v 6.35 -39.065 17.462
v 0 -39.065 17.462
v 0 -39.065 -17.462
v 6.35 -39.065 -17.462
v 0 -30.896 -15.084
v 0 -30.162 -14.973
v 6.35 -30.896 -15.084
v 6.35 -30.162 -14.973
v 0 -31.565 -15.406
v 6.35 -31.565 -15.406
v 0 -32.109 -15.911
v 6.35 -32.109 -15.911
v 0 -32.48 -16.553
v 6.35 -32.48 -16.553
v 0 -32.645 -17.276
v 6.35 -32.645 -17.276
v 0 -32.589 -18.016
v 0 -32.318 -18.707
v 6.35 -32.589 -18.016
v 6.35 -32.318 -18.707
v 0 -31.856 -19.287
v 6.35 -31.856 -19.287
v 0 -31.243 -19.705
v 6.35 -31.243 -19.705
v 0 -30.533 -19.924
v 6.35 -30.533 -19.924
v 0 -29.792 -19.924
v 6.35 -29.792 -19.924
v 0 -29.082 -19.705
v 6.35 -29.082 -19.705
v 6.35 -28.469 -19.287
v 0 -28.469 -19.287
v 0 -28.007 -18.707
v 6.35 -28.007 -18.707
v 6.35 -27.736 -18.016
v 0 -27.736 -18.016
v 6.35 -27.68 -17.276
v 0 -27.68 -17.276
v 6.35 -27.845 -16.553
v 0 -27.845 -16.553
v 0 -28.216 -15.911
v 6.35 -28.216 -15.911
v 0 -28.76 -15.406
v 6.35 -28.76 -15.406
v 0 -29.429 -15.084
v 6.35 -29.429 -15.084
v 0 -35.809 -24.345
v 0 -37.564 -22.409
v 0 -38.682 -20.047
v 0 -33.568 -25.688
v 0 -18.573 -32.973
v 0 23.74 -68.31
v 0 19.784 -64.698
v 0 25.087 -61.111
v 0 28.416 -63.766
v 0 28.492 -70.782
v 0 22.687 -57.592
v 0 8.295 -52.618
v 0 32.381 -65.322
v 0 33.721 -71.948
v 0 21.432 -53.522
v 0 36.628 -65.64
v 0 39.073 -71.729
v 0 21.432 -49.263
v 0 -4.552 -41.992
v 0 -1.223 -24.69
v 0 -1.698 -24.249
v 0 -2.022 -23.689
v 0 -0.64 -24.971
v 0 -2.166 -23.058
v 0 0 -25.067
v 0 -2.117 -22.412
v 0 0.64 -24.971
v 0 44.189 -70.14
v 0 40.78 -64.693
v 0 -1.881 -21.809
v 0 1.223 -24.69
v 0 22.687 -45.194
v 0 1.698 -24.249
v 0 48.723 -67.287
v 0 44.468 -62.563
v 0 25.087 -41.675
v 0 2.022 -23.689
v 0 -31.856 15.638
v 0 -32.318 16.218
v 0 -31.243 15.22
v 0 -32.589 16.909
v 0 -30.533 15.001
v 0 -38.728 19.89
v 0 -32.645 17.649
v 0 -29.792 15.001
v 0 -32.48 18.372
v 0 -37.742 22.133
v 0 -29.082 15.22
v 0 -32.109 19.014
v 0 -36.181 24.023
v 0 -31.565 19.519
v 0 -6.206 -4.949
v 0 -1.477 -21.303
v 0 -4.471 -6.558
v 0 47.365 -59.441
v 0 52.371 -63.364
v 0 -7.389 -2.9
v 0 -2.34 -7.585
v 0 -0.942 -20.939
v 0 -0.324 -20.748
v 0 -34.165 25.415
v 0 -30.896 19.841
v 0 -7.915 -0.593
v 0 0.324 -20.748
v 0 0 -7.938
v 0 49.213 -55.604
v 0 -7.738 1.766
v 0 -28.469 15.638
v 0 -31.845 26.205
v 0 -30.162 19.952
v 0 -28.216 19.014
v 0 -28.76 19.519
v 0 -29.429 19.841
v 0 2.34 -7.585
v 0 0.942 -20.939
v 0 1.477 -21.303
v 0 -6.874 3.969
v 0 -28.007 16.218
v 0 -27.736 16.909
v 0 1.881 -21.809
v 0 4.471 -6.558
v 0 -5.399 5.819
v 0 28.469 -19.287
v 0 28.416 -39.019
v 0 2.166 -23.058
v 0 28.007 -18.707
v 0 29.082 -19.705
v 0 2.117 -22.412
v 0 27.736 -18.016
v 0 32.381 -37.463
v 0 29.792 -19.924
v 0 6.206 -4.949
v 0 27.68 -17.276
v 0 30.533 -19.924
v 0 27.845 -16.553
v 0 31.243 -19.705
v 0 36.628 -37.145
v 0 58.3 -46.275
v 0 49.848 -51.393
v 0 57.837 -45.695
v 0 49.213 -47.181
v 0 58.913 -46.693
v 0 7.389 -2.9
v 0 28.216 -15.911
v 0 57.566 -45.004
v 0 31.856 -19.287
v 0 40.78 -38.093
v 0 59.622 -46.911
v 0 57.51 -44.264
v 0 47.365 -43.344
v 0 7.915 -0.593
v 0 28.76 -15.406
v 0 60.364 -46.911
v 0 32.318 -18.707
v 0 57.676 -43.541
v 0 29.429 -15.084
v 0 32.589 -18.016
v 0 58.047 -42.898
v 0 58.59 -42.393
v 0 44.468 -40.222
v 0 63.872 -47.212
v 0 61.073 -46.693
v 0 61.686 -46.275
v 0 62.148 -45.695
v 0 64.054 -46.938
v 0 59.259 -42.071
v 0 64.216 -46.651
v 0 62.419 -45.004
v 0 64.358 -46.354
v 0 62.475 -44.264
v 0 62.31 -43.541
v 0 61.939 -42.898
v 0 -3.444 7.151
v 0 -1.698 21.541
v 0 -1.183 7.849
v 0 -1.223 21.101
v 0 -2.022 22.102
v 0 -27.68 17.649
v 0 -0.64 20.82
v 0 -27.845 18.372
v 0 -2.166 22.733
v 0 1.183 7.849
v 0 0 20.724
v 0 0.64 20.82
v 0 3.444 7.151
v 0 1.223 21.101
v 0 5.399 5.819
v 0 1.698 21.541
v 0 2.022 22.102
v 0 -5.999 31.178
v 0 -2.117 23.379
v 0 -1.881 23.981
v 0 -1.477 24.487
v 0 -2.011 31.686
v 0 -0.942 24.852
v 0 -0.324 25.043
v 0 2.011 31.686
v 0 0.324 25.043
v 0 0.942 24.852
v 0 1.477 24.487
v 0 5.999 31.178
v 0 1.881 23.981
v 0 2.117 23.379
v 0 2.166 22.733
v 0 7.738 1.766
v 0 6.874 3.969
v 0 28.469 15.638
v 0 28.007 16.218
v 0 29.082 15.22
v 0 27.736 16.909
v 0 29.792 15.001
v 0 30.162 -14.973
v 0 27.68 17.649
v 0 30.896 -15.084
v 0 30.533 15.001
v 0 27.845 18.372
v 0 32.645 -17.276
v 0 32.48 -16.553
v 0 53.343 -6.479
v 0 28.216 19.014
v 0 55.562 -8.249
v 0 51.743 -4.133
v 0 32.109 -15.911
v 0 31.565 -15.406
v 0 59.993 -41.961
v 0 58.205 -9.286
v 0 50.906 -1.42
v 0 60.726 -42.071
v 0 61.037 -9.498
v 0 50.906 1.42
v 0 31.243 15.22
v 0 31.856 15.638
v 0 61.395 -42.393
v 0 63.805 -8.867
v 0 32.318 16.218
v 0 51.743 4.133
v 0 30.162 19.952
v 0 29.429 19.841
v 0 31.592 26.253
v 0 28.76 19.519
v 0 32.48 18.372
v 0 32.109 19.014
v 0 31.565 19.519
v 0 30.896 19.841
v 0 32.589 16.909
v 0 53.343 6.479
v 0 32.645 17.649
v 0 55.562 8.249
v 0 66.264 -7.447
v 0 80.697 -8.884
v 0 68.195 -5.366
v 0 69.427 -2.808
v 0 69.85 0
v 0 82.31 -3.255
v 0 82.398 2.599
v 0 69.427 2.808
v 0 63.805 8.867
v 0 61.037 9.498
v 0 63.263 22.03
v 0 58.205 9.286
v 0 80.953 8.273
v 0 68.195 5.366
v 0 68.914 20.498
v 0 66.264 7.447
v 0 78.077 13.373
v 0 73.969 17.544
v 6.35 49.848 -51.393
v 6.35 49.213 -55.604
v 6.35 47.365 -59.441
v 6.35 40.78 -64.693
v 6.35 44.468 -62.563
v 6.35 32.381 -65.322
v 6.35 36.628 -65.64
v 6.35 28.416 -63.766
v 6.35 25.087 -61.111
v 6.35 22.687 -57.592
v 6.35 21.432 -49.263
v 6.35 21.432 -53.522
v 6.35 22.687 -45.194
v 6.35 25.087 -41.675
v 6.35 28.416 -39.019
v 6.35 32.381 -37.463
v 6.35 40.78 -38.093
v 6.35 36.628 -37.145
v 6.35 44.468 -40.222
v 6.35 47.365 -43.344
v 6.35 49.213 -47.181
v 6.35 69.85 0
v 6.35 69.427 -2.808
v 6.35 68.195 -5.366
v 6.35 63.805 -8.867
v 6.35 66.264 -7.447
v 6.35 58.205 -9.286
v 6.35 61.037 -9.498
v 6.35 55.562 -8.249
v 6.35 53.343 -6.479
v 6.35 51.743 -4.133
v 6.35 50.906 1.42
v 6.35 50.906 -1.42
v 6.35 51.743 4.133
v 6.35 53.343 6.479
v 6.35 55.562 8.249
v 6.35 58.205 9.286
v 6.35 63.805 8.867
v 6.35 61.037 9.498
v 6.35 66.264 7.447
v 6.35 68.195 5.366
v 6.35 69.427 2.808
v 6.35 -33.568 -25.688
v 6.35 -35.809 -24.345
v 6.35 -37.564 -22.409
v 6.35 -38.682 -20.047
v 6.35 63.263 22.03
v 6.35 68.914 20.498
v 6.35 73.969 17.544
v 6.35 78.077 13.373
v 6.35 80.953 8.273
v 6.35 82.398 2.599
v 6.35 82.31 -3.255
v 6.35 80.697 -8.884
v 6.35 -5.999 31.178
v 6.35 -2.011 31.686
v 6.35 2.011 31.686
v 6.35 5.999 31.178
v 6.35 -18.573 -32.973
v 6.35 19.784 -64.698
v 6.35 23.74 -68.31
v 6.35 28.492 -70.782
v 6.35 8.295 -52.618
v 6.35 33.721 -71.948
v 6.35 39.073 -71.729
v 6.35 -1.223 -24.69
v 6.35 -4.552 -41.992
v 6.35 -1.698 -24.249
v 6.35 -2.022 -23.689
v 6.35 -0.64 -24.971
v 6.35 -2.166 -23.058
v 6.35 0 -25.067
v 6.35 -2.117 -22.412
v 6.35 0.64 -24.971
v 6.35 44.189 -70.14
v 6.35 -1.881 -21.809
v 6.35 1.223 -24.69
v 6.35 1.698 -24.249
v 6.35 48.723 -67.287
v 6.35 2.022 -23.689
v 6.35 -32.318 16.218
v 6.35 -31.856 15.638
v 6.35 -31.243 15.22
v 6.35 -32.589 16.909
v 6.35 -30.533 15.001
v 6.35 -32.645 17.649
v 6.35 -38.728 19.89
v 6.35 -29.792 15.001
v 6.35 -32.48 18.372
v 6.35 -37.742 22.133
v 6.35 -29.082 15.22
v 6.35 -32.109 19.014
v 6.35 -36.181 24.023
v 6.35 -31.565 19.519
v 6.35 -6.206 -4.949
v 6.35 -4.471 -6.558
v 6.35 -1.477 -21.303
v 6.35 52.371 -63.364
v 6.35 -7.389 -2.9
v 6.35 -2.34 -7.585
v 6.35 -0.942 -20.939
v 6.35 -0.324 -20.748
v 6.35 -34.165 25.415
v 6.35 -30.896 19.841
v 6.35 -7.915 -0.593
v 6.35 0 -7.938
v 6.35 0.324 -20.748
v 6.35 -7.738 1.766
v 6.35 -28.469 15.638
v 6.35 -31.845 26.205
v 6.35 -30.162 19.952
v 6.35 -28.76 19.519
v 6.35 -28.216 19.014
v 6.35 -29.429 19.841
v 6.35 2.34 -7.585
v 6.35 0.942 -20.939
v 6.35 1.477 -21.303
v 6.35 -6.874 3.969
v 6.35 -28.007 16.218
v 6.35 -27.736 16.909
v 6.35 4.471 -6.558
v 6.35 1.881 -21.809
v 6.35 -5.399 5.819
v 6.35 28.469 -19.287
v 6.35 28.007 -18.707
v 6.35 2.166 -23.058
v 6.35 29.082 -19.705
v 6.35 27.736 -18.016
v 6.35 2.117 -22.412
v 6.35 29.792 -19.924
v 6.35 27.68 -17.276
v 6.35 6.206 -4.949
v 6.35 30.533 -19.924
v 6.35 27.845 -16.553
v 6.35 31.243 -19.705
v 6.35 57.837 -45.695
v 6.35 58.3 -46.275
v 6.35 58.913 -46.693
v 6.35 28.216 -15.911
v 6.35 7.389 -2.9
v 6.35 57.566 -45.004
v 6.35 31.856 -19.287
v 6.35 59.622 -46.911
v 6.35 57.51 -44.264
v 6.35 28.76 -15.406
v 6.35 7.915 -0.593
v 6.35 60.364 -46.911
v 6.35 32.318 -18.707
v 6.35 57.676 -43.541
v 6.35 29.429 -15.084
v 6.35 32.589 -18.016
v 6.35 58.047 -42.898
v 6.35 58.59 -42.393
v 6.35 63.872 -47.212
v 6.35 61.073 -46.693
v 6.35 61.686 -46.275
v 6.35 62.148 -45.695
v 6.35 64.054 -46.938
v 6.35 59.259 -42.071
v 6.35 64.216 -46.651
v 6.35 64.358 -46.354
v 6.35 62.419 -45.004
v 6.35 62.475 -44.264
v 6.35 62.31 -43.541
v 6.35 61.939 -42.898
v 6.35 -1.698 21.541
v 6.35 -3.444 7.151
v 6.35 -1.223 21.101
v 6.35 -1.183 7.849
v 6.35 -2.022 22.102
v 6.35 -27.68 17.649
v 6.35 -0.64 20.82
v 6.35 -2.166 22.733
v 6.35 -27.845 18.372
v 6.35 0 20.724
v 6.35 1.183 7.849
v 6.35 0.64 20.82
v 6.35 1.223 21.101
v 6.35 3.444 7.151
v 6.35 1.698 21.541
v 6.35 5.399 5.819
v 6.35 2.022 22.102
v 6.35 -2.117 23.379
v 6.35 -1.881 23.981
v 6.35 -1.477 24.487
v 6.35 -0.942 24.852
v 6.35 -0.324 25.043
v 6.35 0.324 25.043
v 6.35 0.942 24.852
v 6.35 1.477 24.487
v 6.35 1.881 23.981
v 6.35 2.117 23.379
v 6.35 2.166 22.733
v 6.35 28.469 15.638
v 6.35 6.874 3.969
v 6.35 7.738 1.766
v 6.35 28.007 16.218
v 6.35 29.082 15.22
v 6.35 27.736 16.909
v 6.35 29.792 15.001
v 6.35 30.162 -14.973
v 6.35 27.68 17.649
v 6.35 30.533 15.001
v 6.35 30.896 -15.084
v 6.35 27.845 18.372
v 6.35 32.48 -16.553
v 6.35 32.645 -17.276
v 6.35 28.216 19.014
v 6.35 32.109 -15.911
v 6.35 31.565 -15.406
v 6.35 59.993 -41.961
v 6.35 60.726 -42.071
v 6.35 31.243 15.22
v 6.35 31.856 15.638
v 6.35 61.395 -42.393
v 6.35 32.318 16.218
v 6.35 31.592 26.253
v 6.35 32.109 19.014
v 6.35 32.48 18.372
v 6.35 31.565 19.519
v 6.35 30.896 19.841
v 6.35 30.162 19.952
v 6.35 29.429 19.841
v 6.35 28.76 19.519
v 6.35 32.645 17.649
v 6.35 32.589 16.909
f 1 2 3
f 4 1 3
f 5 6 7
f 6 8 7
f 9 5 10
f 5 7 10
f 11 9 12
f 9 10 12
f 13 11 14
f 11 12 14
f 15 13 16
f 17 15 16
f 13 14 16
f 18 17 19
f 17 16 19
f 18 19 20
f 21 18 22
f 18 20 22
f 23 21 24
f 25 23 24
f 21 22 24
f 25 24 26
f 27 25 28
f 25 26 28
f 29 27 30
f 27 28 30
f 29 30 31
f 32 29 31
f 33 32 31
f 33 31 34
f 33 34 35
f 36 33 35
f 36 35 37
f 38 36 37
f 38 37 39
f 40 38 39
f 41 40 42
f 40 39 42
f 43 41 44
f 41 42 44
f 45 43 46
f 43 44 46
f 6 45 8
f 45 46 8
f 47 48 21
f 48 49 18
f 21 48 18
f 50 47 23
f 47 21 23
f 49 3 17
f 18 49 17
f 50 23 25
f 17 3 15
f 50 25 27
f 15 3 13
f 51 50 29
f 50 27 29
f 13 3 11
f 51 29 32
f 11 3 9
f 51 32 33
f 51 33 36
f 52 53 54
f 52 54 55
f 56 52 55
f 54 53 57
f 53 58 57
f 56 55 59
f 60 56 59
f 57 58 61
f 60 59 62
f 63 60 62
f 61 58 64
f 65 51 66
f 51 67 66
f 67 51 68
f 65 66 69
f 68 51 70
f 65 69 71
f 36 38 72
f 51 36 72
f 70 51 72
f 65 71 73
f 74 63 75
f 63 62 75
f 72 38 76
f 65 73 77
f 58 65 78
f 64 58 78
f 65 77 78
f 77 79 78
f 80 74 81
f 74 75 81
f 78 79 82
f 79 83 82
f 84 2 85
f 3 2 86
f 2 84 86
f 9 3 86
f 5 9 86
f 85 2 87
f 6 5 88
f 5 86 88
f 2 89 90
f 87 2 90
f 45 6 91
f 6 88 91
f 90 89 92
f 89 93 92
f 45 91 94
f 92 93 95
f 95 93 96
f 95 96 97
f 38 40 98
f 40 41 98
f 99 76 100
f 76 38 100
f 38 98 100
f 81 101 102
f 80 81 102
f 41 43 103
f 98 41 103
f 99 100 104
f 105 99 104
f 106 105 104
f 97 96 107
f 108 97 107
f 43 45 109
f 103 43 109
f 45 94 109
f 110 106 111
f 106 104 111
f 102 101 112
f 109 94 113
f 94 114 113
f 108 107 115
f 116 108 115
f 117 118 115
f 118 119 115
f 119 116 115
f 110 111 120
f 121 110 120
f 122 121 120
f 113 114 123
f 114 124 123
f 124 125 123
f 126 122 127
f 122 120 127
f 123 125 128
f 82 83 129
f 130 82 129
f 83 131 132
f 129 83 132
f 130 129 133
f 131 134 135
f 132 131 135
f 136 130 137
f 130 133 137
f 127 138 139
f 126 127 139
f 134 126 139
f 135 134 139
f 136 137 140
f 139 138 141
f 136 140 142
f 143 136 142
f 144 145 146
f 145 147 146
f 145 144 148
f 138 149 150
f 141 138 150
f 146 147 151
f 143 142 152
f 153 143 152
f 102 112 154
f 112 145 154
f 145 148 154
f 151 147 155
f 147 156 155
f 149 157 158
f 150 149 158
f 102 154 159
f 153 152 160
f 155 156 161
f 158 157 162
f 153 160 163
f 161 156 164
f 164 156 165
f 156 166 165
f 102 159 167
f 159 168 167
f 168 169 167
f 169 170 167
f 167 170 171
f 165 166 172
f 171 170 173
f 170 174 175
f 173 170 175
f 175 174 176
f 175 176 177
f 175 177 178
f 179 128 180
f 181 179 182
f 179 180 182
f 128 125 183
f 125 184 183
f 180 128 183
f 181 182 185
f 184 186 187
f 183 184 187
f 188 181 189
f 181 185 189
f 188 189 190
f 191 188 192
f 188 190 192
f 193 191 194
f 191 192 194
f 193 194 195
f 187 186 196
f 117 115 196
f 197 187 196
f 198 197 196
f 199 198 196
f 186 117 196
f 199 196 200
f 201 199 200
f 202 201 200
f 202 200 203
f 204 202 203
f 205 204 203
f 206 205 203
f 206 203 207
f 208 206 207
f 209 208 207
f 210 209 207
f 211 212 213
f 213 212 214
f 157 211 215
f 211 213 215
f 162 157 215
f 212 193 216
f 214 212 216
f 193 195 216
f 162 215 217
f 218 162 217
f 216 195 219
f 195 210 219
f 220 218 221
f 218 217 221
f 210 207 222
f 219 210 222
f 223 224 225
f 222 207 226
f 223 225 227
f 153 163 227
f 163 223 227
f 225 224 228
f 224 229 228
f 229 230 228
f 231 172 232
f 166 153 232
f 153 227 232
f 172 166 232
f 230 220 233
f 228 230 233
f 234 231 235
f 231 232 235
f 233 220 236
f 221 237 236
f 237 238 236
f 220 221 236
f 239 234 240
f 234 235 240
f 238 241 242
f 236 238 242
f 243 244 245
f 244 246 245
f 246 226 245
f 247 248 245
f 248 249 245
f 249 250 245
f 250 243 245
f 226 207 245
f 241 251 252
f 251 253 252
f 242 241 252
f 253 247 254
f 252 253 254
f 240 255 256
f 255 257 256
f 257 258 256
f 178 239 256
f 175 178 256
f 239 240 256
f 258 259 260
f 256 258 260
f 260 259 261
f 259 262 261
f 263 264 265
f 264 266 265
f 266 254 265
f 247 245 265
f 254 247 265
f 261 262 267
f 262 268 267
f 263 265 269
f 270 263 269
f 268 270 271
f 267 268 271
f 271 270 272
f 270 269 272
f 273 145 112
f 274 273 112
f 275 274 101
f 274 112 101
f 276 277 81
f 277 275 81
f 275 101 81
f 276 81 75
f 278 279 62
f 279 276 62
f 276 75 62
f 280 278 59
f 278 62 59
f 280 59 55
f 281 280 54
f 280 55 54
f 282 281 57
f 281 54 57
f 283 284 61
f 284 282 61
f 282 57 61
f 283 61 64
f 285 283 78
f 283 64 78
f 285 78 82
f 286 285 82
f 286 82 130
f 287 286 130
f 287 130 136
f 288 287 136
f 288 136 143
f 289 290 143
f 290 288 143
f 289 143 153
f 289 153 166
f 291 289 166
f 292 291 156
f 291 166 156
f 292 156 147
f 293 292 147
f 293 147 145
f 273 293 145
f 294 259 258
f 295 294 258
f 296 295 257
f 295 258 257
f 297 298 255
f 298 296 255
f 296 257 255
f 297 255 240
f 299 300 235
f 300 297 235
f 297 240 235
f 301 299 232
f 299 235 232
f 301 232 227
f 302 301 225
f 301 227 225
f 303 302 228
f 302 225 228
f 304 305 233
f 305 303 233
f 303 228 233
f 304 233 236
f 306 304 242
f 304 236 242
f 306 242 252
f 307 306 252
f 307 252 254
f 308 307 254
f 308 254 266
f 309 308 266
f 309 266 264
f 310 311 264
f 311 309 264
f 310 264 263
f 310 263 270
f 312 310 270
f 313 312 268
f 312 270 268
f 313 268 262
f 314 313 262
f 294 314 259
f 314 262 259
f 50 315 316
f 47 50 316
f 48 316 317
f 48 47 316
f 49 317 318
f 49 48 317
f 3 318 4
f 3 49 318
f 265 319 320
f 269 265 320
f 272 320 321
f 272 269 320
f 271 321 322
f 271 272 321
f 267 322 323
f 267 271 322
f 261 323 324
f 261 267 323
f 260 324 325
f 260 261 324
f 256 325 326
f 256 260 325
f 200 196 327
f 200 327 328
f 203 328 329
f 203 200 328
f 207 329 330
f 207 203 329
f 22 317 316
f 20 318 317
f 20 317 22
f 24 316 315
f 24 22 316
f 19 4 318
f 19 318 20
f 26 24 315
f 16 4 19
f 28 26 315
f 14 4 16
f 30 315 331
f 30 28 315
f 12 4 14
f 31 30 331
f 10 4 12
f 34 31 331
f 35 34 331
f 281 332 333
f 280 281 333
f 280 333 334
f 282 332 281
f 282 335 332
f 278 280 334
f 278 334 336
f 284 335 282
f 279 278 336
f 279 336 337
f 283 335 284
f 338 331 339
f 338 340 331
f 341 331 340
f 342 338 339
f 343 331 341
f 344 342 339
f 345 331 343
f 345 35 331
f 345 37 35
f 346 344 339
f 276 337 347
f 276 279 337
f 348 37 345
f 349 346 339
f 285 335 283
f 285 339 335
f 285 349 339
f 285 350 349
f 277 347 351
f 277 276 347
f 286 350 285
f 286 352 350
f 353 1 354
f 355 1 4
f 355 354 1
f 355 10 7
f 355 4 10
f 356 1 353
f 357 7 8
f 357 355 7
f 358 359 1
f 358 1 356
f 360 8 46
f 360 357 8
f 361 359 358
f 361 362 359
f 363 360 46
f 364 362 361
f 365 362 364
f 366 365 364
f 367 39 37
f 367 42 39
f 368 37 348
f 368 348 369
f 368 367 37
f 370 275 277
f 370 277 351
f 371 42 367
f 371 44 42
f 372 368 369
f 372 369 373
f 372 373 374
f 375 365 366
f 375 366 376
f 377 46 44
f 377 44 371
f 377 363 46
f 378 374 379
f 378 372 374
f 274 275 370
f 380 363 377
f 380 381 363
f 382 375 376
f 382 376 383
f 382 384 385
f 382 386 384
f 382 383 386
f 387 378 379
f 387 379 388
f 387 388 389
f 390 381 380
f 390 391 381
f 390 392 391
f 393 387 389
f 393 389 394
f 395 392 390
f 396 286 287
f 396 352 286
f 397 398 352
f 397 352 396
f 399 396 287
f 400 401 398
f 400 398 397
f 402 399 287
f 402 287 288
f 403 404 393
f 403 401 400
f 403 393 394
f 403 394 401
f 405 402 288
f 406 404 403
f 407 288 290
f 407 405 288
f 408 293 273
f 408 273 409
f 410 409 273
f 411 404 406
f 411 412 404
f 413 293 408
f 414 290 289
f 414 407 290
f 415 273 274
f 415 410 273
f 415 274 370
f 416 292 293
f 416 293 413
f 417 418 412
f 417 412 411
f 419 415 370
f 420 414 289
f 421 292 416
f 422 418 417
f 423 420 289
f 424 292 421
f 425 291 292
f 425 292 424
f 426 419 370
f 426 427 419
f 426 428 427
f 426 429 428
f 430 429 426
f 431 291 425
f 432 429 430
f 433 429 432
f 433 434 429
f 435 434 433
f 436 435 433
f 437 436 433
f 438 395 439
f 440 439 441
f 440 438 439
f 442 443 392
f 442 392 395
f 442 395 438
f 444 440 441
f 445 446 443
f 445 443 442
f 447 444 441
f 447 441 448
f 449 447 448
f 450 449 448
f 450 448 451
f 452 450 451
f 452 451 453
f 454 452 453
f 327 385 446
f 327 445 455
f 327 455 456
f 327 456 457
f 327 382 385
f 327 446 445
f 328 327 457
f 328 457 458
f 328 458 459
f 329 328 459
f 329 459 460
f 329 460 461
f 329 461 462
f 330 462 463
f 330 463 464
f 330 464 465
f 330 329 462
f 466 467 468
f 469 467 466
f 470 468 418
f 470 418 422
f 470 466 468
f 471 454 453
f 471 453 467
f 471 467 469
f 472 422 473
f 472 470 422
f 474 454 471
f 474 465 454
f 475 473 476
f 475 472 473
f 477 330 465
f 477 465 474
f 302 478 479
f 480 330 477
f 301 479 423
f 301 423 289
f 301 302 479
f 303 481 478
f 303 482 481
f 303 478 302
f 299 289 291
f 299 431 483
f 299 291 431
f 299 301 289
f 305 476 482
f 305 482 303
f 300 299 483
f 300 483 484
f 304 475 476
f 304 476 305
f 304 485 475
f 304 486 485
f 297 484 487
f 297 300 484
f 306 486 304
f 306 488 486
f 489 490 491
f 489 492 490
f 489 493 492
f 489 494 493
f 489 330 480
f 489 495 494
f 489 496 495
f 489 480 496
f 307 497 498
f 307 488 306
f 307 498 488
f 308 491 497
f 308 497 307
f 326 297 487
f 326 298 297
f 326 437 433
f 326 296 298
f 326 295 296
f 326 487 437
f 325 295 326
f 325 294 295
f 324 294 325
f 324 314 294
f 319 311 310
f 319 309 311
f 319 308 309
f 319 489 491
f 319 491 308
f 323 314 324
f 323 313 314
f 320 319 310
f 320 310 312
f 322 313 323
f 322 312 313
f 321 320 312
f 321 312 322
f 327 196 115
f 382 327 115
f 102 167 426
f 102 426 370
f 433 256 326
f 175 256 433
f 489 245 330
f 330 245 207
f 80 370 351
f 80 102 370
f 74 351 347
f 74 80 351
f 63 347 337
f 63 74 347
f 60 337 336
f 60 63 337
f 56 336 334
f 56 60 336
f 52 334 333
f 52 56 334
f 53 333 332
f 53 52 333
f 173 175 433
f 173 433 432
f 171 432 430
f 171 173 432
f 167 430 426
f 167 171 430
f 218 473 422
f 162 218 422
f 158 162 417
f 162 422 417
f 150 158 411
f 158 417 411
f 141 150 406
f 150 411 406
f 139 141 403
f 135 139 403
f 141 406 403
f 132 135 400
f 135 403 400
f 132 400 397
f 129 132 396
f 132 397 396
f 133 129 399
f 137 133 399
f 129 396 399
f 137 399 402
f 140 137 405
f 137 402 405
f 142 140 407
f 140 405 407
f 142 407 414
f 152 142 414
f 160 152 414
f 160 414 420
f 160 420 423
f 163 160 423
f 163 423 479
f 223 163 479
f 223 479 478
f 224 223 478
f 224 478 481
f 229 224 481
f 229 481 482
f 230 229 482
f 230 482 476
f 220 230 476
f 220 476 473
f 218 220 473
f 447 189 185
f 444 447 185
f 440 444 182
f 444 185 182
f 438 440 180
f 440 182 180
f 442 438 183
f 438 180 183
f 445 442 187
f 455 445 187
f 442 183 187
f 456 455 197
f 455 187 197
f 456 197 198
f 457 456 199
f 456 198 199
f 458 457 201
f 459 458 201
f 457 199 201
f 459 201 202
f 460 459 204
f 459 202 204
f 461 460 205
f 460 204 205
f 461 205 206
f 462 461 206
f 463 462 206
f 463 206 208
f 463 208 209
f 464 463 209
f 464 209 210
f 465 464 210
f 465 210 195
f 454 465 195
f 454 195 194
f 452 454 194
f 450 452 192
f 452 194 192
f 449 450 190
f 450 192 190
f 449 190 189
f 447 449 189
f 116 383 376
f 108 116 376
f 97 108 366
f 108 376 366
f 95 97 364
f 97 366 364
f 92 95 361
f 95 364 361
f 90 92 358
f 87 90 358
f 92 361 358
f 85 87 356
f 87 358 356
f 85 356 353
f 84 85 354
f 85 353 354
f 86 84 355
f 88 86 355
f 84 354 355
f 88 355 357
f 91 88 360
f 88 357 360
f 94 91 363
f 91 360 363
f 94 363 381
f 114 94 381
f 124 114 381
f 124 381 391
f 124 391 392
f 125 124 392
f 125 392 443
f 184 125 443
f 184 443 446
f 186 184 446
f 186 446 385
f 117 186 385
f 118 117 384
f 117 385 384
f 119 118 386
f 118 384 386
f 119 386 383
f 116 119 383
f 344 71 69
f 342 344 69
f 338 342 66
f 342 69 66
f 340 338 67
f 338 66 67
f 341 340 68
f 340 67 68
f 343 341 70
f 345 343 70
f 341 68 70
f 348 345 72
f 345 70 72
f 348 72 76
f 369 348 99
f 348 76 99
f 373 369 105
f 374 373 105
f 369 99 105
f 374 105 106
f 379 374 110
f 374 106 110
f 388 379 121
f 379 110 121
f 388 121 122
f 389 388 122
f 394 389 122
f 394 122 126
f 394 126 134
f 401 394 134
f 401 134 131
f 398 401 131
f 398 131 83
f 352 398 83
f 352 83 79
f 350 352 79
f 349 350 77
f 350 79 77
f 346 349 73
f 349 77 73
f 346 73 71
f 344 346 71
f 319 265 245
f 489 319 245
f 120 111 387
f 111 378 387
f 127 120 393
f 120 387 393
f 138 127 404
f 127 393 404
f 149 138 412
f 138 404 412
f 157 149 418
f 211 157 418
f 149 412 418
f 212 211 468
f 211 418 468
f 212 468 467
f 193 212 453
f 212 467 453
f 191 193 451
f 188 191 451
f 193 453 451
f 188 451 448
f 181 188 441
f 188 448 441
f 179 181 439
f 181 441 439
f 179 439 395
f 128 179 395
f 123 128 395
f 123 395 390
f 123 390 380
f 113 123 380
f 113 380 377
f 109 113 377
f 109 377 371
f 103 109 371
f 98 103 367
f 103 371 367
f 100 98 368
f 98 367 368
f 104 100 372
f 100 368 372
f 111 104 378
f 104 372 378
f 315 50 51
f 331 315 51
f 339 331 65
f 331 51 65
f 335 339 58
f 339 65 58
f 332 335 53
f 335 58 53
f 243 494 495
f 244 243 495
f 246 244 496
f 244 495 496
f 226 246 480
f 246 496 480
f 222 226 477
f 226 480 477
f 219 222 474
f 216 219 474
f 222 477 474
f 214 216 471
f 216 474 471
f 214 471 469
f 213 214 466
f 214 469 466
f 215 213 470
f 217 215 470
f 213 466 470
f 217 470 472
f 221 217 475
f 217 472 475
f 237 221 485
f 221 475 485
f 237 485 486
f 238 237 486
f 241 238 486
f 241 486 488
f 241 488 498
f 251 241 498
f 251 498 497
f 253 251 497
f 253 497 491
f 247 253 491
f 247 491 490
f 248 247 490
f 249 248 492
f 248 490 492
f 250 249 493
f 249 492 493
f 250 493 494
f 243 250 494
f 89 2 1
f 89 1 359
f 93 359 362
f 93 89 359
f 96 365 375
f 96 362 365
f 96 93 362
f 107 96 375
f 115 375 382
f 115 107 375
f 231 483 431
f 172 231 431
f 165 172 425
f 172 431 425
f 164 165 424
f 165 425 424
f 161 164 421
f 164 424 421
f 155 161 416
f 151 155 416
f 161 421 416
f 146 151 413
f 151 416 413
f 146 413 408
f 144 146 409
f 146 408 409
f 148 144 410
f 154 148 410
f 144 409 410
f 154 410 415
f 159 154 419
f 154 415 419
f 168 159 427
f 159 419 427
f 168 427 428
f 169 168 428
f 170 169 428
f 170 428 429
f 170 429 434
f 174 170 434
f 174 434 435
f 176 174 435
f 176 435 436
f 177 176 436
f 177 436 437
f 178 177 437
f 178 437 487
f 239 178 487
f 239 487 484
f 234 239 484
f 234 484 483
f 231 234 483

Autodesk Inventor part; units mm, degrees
ref_plane "YZ Plane" through (0, 0, 0) normal (1, 0, 0) x (0, 1, 0)
ref_plane "XZ Plane" through (0, 0, 0) normal (0, 1, 0) x (-1, 0, 0)
ref_plane "XY Plane" through (0, 0, 0) normal (0, 0, 1) x (1, 0, 0)
sketch "Sketch1" plane through (0, 0, 0) normal (1, 0, 0) x (0, 1, 0)
  circle A0 centre (0, 0) radius 38.1 construction
  line L0 (27.94, -25.903) -> (27.94, -76.2) construction
  line L1 (27.94, -76.2) -> (-27.94, -76.2) construction
  line L2 (-27.94, -76.2) -> (-27.94, -25.903) construction
  line L3 (-30.1625, -17.4625) -> (30.1625, -17.4625) construction
  line L4 (30.1625, -17.4625) -> (30.1625, 17.4625) construction
  line L5 (30.1625, 17.4625) -> (-30.1625, 17.4625) construction
  line L6 (-30.1625, 17.4625) -> (-30.1625, -17.4625) construction
  line L7 (-30.1625, -17.4625) -> (30.1625, 17.4625) construction
  line L8 (30.1625, -17.4625) -> (-30.1625, 17.4625) construction
  circle A1 centre (30.1625, 17.4625) radius 2.5527 construction
  circle A2 centre (30.1625, -17.4625) radius 2.5527 construction
  circle A3 centre (-30.1625, -17.4625) radius 2.5527 construction
  circle A4 centre (-30.1625, 17.4625) radius 2.5527 construction
  point P0 (0, -76.2)
  dimension "d0" = 76.2
  dimension "d1" = 55.88
  dimension "d2" = 76.2
  dimension "d3" = 60.325
  dimension "d4" = 34.925
  dimension "d5" = 5.1054
  dimension "d6" = 5.1054
  dimension "d7" = 5.1054
  dimension "d8" = 5.1054
sketch "Sketch2" plane through (0, 0, 0) normal (1, 0, 0) x (0, 1, 0)
  line L0 (-30.1625, -17.4625) -> (30.1625, -17.4625) construction
  circle A0 centre (30.1625, -17.4625) radius 2.5527 construction
  circle A1 centre (-30.1625, -17.4625) radius 2.5527 construction
  line L1 (-30.1625, 17.4625) -> (-30.1625, -17.4625) construction
  circle A2 centre (-30.1625, 17.4625) radius 2.5527 construction
  line L2 (30.1625, -17.4625) -> (30.1625, 17.4625) construction
  line L3 (30.1625, -17.4625) -> (-30.1625, 17.4625) construction
  line L4 (30.1625, 17.4625) -> (-30.1625, 17.4625) construction
  line L5 (-30.1625, -17.4625) -> (30.1625, 17.4625) construction
  circle A3 centre (30.1625, 17.4625) radius 2.5527 construction
  circle A4 centre (0, 0) radius 38.1 construction
  line L6 (27.94, -25.903) -> (27.94, -76.2) construction
  line L7 (27.94, -76.2) -> (-27.94, -76.2) construction
  line L8 (-27.94, -76.2) -> (-27.94, -25.903) construction
  circle A5 centre (60.325, 0) radius 12.7 construction
  circle A6 centre (35.56, -51.3927) radius 14.2875
  circle A7 centre (35.56, -51.3927) radius 31.75 construction
  circle A8 centre (60.325, 0) radius 9.525
  circle A9 centre (60.325, 0) radius 22.225 construction
  circle A10 centre (30.1625, 17.4625) radius 8.9027 construction
  circle A11 centre (30.1625, -17.4625) radius 8.9027 construction
  circle A12 centre (-30.1625, -17.4625) radius 8.9027 construction
  circle A13 centre (-30.1625, 17.4625) radius 8.9027 construction
  line L9 (63.2628, 22.03) -> (31.3393, 26.2871)
  line L10 (-39.0652, 17.4625) -> (-39.0652, -17.4625)
  arc A14 (80.6974, -8.8835) -> (63.2628, 22.03) centre (60.325, 0) ccw
  arc A15 (31.3393, 26.2871) -> (31.8447, 26.2048) centre (30.1625, 17.4625) ccw
  arc A16 (-31.8447, 26.2048) -> (-39.0652, 17.4625) centre (-30.1625, 17.4625) ccw
  arc A17 (-39.0652, -17.4625) -> (-33.568, -25.6881) centre (-30.1625, -17.4625) ccw
  circle A18 centre (35.56, -51.3927) radius 25.4 construction
  circle A19 centre (17.331, -33.7048) radius 4.7625 construction
  circle A20 centre (32.8295, -73.6177) radius 4.8895 construction
  circle A21 centre (59.9927, -44.45) radius 4.7625 construction
  line L11 (80.6974, -8.8835) -> (64.3582, -46.3536)
  circle A22 centre (0, 0) radius 25.4
  circle A23 centre (0, 0) radius 31.75 construction
  line L12 (31.8447, 26.2048) -> (5.9993, 31.178)
  line L13 (-5.9993, 31.178) -> (-31.8447, 26.2048)
  arc A24 (5.9993, 31.178) -> (-5.9993, 31.178) centre (0, 0) ccw
  circle A25 centre (35.56, -51.3927) radius 29.9974 construction
  circle A26 centre (35.56, -51.3927) radius 20.6375 construction
  circle A27 centre (35.56, -51.3927) radius 7.62 construction
  line L14 (63.8721, -47.2125) -> (52.3707, -63.3638)
  arc A28 (63.8721, -47.2125) -> (64.3582, -46.3536) centre (59.9927, -44.45) ccw
  arc A29 (19.784, -64.6978) -> (-33.568, -25.6881) centre (-87.007, -154.7631) ccw
  arc A30 (19.784, -64.6978) -> (52.3707, -63.3638) centre (35.56, -51.3927) ccw
  point P0 (0, -76.2)
  point P1 (71.3235, -6.35)
  point P2 (71.3235, 6.35)
  point P3 (60.325, 12.7)
  point P4 (49.3265, 6.35)
  point P5 (49.3265, -6.35)
  point P6 (60.325, -12.7)
  point P7 (29.3562, -76.0235)
  point P8 (31.5932, 26.2532)
  dimension "d9" = 25.4
  dimension "d14" = 360
  dimension "d16" = 28.575
  dimension "d17" = 57.0484
  dimension "d19" = 63.5
  dimension "d20" = 19.05
  dimension "d23" = 6.35
  dimension "d43" = 360
  dimension "d45" = 9.525
  dimension "d46" = 9.779
  dimension "d47" = 9.525
  dimension "d56" = 50.8
  dimension "d57" = 6.35
  dimension "d58" = 44.45
  dimension "d60" = 76.2
  dimension "d65" = 59.9948
  dimension "d66" = 6.35
  dimension "d75" = 15.24
  dimension "d76" = 50.8
  dimension "d77" = 44.45
  dimension "d78" = 22.225
  dimension "d79" = 139.7
extrude "Extrusion1" add sketch "Sketch2" along normal blind 6.35 contours L12 A15 L9 | A14 L11 A28 L14 A30 A29 A17 L10 A16 L13 A24 L12 L9 | A22
hole "Hole3" at (0, 59.9927, -44.45) at (0, 30.1625, 17.4625) at (0, 30.1625, -17.4625) at (0, -30.1625, -17.4625) at (0, -30.1625, 17.4625) direction (1, 0, 0) diameter 4.9784 end through all clearance for "Flat Head Machine Screw (82)" size "#10" standard "Ansi Unified Screw Threads"
sketch "Sketch6" plane through (6.35, 0, 0) normal (1, 0, 0) x (0, 0, -1)
  circle A0 centre (0, 0) radius 7.9375
  dimension "d80" = 15.875
extrude "Extrusion5" cut sketch "Sketch6" against normal blind 6.35
sketch "Sketch7" plane through (6.35, 0, 0) normal (1, 0, 0) x (0, 0, -1)
  line L0 (-22.8953, 0) -> (22.8953, 0) construction
  point P0 (0, 0)
  point P1 (0, 0)
  dimension "d83" = 45.7905
hole "Hole4" at (6.35, 0, 22.8953) at (6.35, 0, -22.8953) direction (-1, 0, 0) diameter 4.3434 end through all thread size "12-24 UNC" class "2B" standard "ANSI Unified Screw Threads"
properties part number "AR-007" material "Aluminum 6061"
